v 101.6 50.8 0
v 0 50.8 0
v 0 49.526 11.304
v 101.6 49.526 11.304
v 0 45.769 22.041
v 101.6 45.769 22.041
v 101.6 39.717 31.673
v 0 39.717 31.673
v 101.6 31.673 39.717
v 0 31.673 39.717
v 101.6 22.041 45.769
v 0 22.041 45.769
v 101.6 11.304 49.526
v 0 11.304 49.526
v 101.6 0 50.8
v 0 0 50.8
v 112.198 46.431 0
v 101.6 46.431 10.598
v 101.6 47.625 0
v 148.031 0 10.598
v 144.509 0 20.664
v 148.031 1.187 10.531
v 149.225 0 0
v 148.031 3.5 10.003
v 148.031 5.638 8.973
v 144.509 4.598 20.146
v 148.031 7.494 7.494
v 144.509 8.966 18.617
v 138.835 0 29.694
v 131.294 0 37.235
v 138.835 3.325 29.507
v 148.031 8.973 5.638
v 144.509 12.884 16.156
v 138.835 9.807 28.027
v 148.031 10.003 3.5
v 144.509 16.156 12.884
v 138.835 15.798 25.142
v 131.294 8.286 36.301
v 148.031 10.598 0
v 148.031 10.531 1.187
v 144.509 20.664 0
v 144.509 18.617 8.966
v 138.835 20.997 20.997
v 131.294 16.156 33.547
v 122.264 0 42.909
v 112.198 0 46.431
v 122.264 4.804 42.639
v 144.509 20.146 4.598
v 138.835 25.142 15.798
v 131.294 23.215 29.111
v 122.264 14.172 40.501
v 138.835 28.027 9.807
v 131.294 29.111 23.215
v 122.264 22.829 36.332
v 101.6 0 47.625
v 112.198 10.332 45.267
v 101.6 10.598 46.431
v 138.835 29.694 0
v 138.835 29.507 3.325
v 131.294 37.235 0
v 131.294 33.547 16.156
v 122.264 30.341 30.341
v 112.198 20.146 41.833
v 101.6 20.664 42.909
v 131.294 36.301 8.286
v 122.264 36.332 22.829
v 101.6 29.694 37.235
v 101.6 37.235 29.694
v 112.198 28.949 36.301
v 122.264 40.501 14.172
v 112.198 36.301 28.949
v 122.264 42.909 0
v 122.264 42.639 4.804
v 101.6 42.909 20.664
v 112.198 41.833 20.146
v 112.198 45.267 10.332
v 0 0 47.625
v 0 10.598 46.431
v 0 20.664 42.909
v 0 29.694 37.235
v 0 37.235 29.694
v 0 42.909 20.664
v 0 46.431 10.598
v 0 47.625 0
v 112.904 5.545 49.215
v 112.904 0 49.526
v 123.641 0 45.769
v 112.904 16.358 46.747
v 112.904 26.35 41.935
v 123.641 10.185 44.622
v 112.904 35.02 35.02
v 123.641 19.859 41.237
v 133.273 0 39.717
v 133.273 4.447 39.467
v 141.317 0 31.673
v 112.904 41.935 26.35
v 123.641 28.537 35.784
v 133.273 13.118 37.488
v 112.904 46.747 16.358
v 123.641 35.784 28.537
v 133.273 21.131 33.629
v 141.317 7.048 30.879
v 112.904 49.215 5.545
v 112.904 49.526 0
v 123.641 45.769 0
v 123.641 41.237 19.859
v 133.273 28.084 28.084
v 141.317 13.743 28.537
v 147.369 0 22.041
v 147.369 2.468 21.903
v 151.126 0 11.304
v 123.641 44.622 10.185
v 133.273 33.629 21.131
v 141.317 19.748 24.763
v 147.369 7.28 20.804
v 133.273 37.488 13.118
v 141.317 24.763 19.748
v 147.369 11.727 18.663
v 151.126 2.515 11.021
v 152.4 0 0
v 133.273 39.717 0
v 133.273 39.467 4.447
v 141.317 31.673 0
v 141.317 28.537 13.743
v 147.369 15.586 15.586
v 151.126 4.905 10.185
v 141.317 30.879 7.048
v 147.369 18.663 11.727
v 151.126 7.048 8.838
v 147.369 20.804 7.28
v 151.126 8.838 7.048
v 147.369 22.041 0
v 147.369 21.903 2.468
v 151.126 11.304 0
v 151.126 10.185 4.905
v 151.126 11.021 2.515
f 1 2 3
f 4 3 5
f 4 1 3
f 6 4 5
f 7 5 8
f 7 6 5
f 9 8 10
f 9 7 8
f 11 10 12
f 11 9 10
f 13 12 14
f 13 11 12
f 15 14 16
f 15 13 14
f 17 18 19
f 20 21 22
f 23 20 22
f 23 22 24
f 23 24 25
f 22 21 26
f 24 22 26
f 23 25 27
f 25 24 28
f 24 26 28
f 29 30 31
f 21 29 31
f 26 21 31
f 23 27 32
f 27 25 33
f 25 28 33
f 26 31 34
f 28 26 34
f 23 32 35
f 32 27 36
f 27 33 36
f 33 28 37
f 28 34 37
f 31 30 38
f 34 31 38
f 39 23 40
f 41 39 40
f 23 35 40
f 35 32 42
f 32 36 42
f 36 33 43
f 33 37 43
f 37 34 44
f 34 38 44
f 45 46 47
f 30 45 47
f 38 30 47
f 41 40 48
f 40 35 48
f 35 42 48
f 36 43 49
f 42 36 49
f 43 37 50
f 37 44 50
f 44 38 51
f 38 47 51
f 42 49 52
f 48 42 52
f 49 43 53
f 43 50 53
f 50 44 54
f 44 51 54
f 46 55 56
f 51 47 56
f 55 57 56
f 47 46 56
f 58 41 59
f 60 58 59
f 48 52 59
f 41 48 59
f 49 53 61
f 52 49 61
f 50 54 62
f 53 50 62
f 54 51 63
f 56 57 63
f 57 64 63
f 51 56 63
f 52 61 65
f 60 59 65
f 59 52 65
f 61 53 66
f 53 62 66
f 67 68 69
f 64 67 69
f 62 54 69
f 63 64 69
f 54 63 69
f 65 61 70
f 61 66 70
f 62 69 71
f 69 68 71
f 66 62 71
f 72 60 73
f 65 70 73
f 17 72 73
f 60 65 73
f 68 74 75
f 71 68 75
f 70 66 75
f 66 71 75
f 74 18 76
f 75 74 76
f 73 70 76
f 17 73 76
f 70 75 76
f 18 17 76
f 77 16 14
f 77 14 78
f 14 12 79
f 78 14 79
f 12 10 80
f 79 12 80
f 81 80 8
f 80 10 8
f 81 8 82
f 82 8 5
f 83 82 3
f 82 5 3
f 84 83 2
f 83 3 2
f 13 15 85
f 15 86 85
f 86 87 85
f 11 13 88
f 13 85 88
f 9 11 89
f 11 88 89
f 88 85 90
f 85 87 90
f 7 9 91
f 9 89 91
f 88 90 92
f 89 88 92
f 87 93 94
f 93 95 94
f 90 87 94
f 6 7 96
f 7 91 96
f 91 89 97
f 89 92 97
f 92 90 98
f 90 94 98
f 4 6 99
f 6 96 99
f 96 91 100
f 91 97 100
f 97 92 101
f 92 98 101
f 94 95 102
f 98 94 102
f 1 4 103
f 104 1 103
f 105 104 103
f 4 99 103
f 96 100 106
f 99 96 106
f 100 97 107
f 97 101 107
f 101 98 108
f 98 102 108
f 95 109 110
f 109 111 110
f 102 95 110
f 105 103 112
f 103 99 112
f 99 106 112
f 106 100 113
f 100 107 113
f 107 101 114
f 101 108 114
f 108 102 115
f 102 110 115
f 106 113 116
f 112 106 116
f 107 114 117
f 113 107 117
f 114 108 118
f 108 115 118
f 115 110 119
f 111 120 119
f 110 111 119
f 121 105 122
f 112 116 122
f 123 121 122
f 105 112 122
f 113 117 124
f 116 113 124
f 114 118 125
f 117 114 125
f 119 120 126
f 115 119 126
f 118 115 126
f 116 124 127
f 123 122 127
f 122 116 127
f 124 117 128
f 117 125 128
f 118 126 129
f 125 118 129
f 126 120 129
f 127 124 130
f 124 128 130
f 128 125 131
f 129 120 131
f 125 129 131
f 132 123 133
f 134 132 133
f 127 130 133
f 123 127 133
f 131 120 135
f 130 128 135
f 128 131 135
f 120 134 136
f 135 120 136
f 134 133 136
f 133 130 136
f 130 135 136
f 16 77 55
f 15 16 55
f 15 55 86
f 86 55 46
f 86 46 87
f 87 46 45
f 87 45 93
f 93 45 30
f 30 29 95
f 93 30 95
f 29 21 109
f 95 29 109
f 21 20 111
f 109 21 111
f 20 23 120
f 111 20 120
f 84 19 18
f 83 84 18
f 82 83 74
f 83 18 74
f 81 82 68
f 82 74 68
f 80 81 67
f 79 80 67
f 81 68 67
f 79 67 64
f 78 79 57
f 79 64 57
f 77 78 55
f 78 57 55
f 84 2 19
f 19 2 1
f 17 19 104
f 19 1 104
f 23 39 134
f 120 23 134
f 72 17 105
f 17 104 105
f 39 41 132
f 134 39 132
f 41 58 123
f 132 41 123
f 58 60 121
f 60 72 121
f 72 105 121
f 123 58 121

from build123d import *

# Parameters (mm, degrees)
SKETCH2_R           = 50.8
BOSS_EXTRUDE1_DEPTH = 101.6
SKETCH3_R           = 47.625
CUT_EXTRUDE1_DEPTH  = 101.6
SKETCH9_W           = 2921
SKETCH9_H           = 1905
CUT_EXTRUDE4_DEPTH  = 1828.8
SKETCH10_W          = 2914.398267979
SKETCH10_H          = 1269.930665489
CUT_EXTRUDE7_DEPTH  = 508
SKETCH11_W          = 281.911463331
SKETCH11_H          = 233.276474331
CUT_EXTRUDE8_DEPTH  = 153.4


with BuildPart() as part:
    # Sketch2 → Boss-Extrude1 (new body, symmetric)
    with BuildSketch(Plane(origin=(0, 0, 0), x_dir=(0, 0, -1), z_dir=(1, 0, 0))):
        Circle(SKETCH2_R)
    extrude(amount=BOSS_EXTRUDE1_DEPTH, both=True)

    # Sketch3 → Cut-Extrude1 (cut, symmetric)
    with BuildSketch(Plane(origin=(0, 0, 0), x_dir=(0, 0, -1), z_dir=(1, 0, 0))):
        Circle(SKETCH3_R)
    extrude(amount=CUT_EXTRUDE1_DEPTH, both=True, mode=Mode.SUBTRACT)

    # Sketch4 → Revolve-Thin1 (revolve)
    with BuildSketch(Plane.XY):
        with BuildLine():
            ThreePointArc((-101.6, 50.8), (-137.521024484, 35.921024484), (-152.4, 0))
            Line((-152.4, 0), (-149.225, 0))
            ThreePointArc((-149.225, 0), (-135.275960454, 33.675960454), (-101.6, 47.625))
            Line((-101.6, 47.625), (-101.6, 50.8))
        make_face()
    revolve(axis=Axis((-152.4, 0, 0), (1, 0, 0)))

    # Sketch5 → Revolve-Thin2 (revolve)
    with BuildSketch(Plane.XY):
        with BuildLine():
            ThreePointArc((101.6, 50.8), (137.521024484, 35.921024484), (152.4, 0))
            Line((152.4, 0), (149.225, 0))
            ThreePointArc((149.225, 0), (135.275960454, 33.675960454), (101.6, 47.625))
            Line((101.6, 47.625), (101.6, 50.8))
        make_face()
    revolve(axis=Axis((152.4, 0, 0), (-1, 0, 0)))

    # Sketch9 → Cut-Extrude4 (cut)
    with BuildSketch(Plane.XY):
        with Locations((975.277240458, -31.313733989)):
            Rectangle(SKETCH9_W, SKETCH9_H)
    extrude(amount=-CUT_EXTRUDE4_DEPTH, mode=Mode.SUBTRACT)

    # Sketch10 → Cut-Extrude7 (cut)
    with BuildSketch(Plane(origin=(0, 0, 0), x_dir=(1, 0, 0), z_dir=(0, 1, 0))):
        with Locations((902.969453076, -134.938526822)):
            Rectangle(SKETCH10_W, SKETCH10_H)
    extrude(amount=-CUT_EXTRUDE7_DEPTH, mode=Mode.SUBTRACT)

    # Sketch11 → Cut-Extrude8 (cut, through all)
    with BuildSketch(Plane(origin=(0, 0, 0), x_dir=(0, 0, -1), z_dir=(1, 0, 0))):
        with Locations((-43.809030365, 33.571989562)):
            Rectangle(SKETCH11_W, SKETCH11_H)
    extrude(amount=-CUT_EXTRUDE8_DEPTH, mode=Mode.SUBTRACT)


solid = part.part
